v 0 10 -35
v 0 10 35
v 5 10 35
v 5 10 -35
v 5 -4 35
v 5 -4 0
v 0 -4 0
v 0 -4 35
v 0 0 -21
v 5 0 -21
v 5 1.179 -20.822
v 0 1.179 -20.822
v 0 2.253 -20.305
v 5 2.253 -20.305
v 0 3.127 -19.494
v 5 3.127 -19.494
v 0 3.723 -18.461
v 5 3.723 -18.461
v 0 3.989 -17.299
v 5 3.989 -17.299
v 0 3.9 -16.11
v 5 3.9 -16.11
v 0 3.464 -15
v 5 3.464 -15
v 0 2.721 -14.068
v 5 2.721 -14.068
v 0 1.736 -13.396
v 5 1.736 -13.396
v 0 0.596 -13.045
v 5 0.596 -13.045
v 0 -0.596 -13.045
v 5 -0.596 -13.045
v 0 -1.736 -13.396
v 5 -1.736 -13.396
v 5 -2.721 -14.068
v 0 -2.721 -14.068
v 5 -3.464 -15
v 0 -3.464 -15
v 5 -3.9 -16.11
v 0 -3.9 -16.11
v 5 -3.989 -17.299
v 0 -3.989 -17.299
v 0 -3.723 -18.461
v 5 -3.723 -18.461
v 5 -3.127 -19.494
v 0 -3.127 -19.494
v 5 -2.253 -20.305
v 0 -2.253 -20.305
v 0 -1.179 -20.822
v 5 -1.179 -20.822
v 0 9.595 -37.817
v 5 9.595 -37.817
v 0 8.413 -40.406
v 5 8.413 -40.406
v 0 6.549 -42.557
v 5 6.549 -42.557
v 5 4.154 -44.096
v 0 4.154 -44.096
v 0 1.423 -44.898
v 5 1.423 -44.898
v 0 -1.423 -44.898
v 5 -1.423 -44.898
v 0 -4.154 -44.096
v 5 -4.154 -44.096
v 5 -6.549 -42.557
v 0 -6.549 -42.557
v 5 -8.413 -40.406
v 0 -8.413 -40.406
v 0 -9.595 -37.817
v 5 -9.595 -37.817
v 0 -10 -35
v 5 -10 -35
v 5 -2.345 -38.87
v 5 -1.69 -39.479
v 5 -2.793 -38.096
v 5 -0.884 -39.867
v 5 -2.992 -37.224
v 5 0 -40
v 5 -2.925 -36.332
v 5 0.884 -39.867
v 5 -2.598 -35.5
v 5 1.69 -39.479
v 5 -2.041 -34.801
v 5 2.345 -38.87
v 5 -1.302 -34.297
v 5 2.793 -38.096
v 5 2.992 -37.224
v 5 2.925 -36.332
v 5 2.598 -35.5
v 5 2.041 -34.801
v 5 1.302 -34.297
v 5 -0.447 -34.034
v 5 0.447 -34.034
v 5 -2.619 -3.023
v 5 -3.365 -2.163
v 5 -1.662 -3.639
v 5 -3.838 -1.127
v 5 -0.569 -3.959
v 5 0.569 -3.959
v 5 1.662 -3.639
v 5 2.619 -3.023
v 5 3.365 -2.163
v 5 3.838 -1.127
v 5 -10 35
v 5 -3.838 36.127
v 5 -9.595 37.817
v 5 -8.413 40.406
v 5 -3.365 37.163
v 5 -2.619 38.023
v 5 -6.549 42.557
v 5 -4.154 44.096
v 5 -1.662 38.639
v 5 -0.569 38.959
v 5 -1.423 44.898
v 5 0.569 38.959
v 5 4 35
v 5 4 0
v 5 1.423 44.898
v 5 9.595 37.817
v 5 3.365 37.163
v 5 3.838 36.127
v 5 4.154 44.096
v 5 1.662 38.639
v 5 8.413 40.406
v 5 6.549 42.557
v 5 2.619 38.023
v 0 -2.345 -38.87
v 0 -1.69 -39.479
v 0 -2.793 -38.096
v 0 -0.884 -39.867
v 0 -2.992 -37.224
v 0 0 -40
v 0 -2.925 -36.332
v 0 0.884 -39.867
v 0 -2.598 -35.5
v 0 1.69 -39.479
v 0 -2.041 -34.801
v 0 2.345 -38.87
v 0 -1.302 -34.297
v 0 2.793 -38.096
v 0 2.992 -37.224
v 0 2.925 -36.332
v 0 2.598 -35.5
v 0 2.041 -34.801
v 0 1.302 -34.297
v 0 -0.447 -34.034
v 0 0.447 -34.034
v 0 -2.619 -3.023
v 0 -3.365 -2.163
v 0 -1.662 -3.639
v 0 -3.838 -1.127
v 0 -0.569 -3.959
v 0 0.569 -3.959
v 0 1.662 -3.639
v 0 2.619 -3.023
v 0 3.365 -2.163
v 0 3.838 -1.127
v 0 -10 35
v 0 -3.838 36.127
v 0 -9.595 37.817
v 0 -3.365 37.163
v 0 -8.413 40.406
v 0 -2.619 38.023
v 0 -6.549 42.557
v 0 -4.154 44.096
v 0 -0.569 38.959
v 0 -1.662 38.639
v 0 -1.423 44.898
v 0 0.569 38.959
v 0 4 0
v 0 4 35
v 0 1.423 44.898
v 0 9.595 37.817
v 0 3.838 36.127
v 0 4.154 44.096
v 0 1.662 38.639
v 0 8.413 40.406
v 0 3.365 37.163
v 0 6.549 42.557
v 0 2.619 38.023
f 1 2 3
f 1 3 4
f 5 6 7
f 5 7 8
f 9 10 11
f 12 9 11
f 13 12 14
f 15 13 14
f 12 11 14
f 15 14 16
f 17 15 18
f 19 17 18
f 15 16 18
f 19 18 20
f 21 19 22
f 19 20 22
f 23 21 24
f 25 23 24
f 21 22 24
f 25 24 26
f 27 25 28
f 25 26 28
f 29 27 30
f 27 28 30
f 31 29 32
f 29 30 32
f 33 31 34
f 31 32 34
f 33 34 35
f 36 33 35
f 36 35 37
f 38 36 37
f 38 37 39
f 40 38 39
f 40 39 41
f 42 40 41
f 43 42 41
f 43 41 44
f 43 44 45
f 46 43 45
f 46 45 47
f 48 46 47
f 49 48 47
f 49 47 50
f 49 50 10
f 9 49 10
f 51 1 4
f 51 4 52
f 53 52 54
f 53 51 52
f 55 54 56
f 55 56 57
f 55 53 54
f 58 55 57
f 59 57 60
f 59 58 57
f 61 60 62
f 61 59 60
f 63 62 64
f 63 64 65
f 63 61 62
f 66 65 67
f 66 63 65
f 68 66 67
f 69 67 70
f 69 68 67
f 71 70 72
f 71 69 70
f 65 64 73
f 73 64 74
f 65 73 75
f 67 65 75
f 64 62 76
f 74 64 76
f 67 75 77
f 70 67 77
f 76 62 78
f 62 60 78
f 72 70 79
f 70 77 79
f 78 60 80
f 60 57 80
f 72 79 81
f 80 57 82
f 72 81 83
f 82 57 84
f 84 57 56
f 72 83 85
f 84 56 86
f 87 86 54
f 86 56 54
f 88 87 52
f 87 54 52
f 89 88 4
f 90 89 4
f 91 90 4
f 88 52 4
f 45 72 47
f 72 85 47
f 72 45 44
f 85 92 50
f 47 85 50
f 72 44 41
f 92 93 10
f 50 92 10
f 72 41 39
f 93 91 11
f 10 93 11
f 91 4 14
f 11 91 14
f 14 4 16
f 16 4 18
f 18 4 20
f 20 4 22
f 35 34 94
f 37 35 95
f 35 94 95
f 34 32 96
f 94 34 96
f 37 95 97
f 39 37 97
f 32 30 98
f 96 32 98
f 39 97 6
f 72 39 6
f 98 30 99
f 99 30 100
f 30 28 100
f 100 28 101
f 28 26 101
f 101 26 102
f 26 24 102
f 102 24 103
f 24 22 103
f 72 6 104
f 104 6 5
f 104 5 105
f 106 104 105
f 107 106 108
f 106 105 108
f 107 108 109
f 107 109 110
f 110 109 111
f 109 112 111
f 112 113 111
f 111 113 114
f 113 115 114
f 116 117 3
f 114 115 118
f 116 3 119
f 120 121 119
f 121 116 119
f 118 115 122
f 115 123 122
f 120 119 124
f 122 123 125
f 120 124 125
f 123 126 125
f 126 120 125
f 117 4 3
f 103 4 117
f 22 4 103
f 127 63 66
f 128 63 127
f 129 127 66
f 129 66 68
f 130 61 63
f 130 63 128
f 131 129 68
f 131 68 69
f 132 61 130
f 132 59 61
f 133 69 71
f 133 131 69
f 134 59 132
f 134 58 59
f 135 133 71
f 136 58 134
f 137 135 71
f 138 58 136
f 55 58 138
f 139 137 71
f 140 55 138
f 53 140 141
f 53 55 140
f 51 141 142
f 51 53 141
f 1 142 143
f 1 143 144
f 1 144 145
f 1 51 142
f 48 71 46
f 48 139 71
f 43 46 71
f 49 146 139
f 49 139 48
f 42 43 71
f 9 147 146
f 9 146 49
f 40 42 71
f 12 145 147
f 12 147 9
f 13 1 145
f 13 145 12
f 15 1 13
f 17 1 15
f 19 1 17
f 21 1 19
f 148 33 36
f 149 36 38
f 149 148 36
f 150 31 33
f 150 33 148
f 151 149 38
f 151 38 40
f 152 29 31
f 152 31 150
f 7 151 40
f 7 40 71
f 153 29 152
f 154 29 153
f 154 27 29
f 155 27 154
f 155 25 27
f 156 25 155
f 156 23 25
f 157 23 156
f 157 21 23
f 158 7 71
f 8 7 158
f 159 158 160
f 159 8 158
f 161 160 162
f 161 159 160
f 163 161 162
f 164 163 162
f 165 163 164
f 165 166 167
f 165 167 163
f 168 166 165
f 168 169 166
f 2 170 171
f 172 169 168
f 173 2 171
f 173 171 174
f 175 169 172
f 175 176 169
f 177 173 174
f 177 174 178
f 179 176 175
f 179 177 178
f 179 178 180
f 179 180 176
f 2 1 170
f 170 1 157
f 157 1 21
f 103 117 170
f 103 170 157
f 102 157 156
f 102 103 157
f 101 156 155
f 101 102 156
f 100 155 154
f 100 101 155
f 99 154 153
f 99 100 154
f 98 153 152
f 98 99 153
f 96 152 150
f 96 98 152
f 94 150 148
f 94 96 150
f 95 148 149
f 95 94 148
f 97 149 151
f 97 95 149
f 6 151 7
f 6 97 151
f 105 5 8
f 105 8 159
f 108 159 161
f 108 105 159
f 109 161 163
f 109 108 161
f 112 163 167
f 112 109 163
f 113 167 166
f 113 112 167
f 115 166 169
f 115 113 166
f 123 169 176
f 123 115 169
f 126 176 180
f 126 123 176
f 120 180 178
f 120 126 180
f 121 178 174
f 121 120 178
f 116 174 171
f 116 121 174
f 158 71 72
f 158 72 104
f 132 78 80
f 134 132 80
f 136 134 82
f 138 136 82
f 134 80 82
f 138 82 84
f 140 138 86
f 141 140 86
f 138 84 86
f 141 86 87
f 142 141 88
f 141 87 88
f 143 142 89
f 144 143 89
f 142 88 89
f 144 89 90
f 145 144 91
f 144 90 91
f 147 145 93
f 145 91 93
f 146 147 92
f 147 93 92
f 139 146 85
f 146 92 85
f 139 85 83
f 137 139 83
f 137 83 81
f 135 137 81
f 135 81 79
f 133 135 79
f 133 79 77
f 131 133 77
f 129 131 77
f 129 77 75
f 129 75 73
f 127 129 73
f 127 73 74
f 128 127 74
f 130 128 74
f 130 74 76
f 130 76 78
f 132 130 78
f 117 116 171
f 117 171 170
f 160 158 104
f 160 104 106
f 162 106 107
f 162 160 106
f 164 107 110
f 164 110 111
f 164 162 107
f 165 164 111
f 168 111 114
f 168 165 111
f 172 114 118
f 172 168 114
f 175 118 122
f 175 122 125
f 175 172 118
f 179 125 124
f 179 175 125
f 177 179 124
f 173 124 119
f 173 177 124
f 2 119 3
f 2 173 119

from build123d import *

# Parameters (mm, degrees)
BOSS_EXTRUDE1_DEPTH = 5
SKETCH2_R           = 4
SKETCH2_R_2         = 3
CUT_EXTRUDE1_DEPTH  = 6


with BuildPart() as part:
    # Sketch1 → Boss-Extrude1 (new body)
    with BuildSketch(Plane(origin=(0, 0, 0), x_dir=(0, 0, -1), z_dir=(1, 0, 0))):
        with BuildLine():
            Line((-35, 10), (35, 10))
            ThreePointArc((35, 10), (45, 0), (35, -10))
            Line((35, -10), (-35, -10))
            ThreePointArc((-35, -10), (-45, 0), (-35, 10))
        make_face()
    extrude(amount=BOSS_EXTRUDE1_DEPTH)

    # Sketch2 → Cut-Extrude1 (cut, through all)
    with BuildSketch(Plane(origin=(5, 0, 0), x_dir=(0, 0, -1), z_dir=(1, 0, 0))):
        with Locations((17, 0)):
            Circle(SKETCH2_R)
        with Locations((37, 0)):
            Circle(SKETCH2_R_2)
        with BuildLine():
            Line((-35, 4), (0, 4))
            ThreePointArc((0, 4), (4, 0), (0, -4))
            Line((0, -4), (-35, -4))
            ThreePointArc((-35, -4), (-39, 0), (-35, 4))
        make_face()
    extrude(amount=-CUT_EXTRUDE1_DEPTH, mode=Mode.SUBTRACT)


solid = part.part
